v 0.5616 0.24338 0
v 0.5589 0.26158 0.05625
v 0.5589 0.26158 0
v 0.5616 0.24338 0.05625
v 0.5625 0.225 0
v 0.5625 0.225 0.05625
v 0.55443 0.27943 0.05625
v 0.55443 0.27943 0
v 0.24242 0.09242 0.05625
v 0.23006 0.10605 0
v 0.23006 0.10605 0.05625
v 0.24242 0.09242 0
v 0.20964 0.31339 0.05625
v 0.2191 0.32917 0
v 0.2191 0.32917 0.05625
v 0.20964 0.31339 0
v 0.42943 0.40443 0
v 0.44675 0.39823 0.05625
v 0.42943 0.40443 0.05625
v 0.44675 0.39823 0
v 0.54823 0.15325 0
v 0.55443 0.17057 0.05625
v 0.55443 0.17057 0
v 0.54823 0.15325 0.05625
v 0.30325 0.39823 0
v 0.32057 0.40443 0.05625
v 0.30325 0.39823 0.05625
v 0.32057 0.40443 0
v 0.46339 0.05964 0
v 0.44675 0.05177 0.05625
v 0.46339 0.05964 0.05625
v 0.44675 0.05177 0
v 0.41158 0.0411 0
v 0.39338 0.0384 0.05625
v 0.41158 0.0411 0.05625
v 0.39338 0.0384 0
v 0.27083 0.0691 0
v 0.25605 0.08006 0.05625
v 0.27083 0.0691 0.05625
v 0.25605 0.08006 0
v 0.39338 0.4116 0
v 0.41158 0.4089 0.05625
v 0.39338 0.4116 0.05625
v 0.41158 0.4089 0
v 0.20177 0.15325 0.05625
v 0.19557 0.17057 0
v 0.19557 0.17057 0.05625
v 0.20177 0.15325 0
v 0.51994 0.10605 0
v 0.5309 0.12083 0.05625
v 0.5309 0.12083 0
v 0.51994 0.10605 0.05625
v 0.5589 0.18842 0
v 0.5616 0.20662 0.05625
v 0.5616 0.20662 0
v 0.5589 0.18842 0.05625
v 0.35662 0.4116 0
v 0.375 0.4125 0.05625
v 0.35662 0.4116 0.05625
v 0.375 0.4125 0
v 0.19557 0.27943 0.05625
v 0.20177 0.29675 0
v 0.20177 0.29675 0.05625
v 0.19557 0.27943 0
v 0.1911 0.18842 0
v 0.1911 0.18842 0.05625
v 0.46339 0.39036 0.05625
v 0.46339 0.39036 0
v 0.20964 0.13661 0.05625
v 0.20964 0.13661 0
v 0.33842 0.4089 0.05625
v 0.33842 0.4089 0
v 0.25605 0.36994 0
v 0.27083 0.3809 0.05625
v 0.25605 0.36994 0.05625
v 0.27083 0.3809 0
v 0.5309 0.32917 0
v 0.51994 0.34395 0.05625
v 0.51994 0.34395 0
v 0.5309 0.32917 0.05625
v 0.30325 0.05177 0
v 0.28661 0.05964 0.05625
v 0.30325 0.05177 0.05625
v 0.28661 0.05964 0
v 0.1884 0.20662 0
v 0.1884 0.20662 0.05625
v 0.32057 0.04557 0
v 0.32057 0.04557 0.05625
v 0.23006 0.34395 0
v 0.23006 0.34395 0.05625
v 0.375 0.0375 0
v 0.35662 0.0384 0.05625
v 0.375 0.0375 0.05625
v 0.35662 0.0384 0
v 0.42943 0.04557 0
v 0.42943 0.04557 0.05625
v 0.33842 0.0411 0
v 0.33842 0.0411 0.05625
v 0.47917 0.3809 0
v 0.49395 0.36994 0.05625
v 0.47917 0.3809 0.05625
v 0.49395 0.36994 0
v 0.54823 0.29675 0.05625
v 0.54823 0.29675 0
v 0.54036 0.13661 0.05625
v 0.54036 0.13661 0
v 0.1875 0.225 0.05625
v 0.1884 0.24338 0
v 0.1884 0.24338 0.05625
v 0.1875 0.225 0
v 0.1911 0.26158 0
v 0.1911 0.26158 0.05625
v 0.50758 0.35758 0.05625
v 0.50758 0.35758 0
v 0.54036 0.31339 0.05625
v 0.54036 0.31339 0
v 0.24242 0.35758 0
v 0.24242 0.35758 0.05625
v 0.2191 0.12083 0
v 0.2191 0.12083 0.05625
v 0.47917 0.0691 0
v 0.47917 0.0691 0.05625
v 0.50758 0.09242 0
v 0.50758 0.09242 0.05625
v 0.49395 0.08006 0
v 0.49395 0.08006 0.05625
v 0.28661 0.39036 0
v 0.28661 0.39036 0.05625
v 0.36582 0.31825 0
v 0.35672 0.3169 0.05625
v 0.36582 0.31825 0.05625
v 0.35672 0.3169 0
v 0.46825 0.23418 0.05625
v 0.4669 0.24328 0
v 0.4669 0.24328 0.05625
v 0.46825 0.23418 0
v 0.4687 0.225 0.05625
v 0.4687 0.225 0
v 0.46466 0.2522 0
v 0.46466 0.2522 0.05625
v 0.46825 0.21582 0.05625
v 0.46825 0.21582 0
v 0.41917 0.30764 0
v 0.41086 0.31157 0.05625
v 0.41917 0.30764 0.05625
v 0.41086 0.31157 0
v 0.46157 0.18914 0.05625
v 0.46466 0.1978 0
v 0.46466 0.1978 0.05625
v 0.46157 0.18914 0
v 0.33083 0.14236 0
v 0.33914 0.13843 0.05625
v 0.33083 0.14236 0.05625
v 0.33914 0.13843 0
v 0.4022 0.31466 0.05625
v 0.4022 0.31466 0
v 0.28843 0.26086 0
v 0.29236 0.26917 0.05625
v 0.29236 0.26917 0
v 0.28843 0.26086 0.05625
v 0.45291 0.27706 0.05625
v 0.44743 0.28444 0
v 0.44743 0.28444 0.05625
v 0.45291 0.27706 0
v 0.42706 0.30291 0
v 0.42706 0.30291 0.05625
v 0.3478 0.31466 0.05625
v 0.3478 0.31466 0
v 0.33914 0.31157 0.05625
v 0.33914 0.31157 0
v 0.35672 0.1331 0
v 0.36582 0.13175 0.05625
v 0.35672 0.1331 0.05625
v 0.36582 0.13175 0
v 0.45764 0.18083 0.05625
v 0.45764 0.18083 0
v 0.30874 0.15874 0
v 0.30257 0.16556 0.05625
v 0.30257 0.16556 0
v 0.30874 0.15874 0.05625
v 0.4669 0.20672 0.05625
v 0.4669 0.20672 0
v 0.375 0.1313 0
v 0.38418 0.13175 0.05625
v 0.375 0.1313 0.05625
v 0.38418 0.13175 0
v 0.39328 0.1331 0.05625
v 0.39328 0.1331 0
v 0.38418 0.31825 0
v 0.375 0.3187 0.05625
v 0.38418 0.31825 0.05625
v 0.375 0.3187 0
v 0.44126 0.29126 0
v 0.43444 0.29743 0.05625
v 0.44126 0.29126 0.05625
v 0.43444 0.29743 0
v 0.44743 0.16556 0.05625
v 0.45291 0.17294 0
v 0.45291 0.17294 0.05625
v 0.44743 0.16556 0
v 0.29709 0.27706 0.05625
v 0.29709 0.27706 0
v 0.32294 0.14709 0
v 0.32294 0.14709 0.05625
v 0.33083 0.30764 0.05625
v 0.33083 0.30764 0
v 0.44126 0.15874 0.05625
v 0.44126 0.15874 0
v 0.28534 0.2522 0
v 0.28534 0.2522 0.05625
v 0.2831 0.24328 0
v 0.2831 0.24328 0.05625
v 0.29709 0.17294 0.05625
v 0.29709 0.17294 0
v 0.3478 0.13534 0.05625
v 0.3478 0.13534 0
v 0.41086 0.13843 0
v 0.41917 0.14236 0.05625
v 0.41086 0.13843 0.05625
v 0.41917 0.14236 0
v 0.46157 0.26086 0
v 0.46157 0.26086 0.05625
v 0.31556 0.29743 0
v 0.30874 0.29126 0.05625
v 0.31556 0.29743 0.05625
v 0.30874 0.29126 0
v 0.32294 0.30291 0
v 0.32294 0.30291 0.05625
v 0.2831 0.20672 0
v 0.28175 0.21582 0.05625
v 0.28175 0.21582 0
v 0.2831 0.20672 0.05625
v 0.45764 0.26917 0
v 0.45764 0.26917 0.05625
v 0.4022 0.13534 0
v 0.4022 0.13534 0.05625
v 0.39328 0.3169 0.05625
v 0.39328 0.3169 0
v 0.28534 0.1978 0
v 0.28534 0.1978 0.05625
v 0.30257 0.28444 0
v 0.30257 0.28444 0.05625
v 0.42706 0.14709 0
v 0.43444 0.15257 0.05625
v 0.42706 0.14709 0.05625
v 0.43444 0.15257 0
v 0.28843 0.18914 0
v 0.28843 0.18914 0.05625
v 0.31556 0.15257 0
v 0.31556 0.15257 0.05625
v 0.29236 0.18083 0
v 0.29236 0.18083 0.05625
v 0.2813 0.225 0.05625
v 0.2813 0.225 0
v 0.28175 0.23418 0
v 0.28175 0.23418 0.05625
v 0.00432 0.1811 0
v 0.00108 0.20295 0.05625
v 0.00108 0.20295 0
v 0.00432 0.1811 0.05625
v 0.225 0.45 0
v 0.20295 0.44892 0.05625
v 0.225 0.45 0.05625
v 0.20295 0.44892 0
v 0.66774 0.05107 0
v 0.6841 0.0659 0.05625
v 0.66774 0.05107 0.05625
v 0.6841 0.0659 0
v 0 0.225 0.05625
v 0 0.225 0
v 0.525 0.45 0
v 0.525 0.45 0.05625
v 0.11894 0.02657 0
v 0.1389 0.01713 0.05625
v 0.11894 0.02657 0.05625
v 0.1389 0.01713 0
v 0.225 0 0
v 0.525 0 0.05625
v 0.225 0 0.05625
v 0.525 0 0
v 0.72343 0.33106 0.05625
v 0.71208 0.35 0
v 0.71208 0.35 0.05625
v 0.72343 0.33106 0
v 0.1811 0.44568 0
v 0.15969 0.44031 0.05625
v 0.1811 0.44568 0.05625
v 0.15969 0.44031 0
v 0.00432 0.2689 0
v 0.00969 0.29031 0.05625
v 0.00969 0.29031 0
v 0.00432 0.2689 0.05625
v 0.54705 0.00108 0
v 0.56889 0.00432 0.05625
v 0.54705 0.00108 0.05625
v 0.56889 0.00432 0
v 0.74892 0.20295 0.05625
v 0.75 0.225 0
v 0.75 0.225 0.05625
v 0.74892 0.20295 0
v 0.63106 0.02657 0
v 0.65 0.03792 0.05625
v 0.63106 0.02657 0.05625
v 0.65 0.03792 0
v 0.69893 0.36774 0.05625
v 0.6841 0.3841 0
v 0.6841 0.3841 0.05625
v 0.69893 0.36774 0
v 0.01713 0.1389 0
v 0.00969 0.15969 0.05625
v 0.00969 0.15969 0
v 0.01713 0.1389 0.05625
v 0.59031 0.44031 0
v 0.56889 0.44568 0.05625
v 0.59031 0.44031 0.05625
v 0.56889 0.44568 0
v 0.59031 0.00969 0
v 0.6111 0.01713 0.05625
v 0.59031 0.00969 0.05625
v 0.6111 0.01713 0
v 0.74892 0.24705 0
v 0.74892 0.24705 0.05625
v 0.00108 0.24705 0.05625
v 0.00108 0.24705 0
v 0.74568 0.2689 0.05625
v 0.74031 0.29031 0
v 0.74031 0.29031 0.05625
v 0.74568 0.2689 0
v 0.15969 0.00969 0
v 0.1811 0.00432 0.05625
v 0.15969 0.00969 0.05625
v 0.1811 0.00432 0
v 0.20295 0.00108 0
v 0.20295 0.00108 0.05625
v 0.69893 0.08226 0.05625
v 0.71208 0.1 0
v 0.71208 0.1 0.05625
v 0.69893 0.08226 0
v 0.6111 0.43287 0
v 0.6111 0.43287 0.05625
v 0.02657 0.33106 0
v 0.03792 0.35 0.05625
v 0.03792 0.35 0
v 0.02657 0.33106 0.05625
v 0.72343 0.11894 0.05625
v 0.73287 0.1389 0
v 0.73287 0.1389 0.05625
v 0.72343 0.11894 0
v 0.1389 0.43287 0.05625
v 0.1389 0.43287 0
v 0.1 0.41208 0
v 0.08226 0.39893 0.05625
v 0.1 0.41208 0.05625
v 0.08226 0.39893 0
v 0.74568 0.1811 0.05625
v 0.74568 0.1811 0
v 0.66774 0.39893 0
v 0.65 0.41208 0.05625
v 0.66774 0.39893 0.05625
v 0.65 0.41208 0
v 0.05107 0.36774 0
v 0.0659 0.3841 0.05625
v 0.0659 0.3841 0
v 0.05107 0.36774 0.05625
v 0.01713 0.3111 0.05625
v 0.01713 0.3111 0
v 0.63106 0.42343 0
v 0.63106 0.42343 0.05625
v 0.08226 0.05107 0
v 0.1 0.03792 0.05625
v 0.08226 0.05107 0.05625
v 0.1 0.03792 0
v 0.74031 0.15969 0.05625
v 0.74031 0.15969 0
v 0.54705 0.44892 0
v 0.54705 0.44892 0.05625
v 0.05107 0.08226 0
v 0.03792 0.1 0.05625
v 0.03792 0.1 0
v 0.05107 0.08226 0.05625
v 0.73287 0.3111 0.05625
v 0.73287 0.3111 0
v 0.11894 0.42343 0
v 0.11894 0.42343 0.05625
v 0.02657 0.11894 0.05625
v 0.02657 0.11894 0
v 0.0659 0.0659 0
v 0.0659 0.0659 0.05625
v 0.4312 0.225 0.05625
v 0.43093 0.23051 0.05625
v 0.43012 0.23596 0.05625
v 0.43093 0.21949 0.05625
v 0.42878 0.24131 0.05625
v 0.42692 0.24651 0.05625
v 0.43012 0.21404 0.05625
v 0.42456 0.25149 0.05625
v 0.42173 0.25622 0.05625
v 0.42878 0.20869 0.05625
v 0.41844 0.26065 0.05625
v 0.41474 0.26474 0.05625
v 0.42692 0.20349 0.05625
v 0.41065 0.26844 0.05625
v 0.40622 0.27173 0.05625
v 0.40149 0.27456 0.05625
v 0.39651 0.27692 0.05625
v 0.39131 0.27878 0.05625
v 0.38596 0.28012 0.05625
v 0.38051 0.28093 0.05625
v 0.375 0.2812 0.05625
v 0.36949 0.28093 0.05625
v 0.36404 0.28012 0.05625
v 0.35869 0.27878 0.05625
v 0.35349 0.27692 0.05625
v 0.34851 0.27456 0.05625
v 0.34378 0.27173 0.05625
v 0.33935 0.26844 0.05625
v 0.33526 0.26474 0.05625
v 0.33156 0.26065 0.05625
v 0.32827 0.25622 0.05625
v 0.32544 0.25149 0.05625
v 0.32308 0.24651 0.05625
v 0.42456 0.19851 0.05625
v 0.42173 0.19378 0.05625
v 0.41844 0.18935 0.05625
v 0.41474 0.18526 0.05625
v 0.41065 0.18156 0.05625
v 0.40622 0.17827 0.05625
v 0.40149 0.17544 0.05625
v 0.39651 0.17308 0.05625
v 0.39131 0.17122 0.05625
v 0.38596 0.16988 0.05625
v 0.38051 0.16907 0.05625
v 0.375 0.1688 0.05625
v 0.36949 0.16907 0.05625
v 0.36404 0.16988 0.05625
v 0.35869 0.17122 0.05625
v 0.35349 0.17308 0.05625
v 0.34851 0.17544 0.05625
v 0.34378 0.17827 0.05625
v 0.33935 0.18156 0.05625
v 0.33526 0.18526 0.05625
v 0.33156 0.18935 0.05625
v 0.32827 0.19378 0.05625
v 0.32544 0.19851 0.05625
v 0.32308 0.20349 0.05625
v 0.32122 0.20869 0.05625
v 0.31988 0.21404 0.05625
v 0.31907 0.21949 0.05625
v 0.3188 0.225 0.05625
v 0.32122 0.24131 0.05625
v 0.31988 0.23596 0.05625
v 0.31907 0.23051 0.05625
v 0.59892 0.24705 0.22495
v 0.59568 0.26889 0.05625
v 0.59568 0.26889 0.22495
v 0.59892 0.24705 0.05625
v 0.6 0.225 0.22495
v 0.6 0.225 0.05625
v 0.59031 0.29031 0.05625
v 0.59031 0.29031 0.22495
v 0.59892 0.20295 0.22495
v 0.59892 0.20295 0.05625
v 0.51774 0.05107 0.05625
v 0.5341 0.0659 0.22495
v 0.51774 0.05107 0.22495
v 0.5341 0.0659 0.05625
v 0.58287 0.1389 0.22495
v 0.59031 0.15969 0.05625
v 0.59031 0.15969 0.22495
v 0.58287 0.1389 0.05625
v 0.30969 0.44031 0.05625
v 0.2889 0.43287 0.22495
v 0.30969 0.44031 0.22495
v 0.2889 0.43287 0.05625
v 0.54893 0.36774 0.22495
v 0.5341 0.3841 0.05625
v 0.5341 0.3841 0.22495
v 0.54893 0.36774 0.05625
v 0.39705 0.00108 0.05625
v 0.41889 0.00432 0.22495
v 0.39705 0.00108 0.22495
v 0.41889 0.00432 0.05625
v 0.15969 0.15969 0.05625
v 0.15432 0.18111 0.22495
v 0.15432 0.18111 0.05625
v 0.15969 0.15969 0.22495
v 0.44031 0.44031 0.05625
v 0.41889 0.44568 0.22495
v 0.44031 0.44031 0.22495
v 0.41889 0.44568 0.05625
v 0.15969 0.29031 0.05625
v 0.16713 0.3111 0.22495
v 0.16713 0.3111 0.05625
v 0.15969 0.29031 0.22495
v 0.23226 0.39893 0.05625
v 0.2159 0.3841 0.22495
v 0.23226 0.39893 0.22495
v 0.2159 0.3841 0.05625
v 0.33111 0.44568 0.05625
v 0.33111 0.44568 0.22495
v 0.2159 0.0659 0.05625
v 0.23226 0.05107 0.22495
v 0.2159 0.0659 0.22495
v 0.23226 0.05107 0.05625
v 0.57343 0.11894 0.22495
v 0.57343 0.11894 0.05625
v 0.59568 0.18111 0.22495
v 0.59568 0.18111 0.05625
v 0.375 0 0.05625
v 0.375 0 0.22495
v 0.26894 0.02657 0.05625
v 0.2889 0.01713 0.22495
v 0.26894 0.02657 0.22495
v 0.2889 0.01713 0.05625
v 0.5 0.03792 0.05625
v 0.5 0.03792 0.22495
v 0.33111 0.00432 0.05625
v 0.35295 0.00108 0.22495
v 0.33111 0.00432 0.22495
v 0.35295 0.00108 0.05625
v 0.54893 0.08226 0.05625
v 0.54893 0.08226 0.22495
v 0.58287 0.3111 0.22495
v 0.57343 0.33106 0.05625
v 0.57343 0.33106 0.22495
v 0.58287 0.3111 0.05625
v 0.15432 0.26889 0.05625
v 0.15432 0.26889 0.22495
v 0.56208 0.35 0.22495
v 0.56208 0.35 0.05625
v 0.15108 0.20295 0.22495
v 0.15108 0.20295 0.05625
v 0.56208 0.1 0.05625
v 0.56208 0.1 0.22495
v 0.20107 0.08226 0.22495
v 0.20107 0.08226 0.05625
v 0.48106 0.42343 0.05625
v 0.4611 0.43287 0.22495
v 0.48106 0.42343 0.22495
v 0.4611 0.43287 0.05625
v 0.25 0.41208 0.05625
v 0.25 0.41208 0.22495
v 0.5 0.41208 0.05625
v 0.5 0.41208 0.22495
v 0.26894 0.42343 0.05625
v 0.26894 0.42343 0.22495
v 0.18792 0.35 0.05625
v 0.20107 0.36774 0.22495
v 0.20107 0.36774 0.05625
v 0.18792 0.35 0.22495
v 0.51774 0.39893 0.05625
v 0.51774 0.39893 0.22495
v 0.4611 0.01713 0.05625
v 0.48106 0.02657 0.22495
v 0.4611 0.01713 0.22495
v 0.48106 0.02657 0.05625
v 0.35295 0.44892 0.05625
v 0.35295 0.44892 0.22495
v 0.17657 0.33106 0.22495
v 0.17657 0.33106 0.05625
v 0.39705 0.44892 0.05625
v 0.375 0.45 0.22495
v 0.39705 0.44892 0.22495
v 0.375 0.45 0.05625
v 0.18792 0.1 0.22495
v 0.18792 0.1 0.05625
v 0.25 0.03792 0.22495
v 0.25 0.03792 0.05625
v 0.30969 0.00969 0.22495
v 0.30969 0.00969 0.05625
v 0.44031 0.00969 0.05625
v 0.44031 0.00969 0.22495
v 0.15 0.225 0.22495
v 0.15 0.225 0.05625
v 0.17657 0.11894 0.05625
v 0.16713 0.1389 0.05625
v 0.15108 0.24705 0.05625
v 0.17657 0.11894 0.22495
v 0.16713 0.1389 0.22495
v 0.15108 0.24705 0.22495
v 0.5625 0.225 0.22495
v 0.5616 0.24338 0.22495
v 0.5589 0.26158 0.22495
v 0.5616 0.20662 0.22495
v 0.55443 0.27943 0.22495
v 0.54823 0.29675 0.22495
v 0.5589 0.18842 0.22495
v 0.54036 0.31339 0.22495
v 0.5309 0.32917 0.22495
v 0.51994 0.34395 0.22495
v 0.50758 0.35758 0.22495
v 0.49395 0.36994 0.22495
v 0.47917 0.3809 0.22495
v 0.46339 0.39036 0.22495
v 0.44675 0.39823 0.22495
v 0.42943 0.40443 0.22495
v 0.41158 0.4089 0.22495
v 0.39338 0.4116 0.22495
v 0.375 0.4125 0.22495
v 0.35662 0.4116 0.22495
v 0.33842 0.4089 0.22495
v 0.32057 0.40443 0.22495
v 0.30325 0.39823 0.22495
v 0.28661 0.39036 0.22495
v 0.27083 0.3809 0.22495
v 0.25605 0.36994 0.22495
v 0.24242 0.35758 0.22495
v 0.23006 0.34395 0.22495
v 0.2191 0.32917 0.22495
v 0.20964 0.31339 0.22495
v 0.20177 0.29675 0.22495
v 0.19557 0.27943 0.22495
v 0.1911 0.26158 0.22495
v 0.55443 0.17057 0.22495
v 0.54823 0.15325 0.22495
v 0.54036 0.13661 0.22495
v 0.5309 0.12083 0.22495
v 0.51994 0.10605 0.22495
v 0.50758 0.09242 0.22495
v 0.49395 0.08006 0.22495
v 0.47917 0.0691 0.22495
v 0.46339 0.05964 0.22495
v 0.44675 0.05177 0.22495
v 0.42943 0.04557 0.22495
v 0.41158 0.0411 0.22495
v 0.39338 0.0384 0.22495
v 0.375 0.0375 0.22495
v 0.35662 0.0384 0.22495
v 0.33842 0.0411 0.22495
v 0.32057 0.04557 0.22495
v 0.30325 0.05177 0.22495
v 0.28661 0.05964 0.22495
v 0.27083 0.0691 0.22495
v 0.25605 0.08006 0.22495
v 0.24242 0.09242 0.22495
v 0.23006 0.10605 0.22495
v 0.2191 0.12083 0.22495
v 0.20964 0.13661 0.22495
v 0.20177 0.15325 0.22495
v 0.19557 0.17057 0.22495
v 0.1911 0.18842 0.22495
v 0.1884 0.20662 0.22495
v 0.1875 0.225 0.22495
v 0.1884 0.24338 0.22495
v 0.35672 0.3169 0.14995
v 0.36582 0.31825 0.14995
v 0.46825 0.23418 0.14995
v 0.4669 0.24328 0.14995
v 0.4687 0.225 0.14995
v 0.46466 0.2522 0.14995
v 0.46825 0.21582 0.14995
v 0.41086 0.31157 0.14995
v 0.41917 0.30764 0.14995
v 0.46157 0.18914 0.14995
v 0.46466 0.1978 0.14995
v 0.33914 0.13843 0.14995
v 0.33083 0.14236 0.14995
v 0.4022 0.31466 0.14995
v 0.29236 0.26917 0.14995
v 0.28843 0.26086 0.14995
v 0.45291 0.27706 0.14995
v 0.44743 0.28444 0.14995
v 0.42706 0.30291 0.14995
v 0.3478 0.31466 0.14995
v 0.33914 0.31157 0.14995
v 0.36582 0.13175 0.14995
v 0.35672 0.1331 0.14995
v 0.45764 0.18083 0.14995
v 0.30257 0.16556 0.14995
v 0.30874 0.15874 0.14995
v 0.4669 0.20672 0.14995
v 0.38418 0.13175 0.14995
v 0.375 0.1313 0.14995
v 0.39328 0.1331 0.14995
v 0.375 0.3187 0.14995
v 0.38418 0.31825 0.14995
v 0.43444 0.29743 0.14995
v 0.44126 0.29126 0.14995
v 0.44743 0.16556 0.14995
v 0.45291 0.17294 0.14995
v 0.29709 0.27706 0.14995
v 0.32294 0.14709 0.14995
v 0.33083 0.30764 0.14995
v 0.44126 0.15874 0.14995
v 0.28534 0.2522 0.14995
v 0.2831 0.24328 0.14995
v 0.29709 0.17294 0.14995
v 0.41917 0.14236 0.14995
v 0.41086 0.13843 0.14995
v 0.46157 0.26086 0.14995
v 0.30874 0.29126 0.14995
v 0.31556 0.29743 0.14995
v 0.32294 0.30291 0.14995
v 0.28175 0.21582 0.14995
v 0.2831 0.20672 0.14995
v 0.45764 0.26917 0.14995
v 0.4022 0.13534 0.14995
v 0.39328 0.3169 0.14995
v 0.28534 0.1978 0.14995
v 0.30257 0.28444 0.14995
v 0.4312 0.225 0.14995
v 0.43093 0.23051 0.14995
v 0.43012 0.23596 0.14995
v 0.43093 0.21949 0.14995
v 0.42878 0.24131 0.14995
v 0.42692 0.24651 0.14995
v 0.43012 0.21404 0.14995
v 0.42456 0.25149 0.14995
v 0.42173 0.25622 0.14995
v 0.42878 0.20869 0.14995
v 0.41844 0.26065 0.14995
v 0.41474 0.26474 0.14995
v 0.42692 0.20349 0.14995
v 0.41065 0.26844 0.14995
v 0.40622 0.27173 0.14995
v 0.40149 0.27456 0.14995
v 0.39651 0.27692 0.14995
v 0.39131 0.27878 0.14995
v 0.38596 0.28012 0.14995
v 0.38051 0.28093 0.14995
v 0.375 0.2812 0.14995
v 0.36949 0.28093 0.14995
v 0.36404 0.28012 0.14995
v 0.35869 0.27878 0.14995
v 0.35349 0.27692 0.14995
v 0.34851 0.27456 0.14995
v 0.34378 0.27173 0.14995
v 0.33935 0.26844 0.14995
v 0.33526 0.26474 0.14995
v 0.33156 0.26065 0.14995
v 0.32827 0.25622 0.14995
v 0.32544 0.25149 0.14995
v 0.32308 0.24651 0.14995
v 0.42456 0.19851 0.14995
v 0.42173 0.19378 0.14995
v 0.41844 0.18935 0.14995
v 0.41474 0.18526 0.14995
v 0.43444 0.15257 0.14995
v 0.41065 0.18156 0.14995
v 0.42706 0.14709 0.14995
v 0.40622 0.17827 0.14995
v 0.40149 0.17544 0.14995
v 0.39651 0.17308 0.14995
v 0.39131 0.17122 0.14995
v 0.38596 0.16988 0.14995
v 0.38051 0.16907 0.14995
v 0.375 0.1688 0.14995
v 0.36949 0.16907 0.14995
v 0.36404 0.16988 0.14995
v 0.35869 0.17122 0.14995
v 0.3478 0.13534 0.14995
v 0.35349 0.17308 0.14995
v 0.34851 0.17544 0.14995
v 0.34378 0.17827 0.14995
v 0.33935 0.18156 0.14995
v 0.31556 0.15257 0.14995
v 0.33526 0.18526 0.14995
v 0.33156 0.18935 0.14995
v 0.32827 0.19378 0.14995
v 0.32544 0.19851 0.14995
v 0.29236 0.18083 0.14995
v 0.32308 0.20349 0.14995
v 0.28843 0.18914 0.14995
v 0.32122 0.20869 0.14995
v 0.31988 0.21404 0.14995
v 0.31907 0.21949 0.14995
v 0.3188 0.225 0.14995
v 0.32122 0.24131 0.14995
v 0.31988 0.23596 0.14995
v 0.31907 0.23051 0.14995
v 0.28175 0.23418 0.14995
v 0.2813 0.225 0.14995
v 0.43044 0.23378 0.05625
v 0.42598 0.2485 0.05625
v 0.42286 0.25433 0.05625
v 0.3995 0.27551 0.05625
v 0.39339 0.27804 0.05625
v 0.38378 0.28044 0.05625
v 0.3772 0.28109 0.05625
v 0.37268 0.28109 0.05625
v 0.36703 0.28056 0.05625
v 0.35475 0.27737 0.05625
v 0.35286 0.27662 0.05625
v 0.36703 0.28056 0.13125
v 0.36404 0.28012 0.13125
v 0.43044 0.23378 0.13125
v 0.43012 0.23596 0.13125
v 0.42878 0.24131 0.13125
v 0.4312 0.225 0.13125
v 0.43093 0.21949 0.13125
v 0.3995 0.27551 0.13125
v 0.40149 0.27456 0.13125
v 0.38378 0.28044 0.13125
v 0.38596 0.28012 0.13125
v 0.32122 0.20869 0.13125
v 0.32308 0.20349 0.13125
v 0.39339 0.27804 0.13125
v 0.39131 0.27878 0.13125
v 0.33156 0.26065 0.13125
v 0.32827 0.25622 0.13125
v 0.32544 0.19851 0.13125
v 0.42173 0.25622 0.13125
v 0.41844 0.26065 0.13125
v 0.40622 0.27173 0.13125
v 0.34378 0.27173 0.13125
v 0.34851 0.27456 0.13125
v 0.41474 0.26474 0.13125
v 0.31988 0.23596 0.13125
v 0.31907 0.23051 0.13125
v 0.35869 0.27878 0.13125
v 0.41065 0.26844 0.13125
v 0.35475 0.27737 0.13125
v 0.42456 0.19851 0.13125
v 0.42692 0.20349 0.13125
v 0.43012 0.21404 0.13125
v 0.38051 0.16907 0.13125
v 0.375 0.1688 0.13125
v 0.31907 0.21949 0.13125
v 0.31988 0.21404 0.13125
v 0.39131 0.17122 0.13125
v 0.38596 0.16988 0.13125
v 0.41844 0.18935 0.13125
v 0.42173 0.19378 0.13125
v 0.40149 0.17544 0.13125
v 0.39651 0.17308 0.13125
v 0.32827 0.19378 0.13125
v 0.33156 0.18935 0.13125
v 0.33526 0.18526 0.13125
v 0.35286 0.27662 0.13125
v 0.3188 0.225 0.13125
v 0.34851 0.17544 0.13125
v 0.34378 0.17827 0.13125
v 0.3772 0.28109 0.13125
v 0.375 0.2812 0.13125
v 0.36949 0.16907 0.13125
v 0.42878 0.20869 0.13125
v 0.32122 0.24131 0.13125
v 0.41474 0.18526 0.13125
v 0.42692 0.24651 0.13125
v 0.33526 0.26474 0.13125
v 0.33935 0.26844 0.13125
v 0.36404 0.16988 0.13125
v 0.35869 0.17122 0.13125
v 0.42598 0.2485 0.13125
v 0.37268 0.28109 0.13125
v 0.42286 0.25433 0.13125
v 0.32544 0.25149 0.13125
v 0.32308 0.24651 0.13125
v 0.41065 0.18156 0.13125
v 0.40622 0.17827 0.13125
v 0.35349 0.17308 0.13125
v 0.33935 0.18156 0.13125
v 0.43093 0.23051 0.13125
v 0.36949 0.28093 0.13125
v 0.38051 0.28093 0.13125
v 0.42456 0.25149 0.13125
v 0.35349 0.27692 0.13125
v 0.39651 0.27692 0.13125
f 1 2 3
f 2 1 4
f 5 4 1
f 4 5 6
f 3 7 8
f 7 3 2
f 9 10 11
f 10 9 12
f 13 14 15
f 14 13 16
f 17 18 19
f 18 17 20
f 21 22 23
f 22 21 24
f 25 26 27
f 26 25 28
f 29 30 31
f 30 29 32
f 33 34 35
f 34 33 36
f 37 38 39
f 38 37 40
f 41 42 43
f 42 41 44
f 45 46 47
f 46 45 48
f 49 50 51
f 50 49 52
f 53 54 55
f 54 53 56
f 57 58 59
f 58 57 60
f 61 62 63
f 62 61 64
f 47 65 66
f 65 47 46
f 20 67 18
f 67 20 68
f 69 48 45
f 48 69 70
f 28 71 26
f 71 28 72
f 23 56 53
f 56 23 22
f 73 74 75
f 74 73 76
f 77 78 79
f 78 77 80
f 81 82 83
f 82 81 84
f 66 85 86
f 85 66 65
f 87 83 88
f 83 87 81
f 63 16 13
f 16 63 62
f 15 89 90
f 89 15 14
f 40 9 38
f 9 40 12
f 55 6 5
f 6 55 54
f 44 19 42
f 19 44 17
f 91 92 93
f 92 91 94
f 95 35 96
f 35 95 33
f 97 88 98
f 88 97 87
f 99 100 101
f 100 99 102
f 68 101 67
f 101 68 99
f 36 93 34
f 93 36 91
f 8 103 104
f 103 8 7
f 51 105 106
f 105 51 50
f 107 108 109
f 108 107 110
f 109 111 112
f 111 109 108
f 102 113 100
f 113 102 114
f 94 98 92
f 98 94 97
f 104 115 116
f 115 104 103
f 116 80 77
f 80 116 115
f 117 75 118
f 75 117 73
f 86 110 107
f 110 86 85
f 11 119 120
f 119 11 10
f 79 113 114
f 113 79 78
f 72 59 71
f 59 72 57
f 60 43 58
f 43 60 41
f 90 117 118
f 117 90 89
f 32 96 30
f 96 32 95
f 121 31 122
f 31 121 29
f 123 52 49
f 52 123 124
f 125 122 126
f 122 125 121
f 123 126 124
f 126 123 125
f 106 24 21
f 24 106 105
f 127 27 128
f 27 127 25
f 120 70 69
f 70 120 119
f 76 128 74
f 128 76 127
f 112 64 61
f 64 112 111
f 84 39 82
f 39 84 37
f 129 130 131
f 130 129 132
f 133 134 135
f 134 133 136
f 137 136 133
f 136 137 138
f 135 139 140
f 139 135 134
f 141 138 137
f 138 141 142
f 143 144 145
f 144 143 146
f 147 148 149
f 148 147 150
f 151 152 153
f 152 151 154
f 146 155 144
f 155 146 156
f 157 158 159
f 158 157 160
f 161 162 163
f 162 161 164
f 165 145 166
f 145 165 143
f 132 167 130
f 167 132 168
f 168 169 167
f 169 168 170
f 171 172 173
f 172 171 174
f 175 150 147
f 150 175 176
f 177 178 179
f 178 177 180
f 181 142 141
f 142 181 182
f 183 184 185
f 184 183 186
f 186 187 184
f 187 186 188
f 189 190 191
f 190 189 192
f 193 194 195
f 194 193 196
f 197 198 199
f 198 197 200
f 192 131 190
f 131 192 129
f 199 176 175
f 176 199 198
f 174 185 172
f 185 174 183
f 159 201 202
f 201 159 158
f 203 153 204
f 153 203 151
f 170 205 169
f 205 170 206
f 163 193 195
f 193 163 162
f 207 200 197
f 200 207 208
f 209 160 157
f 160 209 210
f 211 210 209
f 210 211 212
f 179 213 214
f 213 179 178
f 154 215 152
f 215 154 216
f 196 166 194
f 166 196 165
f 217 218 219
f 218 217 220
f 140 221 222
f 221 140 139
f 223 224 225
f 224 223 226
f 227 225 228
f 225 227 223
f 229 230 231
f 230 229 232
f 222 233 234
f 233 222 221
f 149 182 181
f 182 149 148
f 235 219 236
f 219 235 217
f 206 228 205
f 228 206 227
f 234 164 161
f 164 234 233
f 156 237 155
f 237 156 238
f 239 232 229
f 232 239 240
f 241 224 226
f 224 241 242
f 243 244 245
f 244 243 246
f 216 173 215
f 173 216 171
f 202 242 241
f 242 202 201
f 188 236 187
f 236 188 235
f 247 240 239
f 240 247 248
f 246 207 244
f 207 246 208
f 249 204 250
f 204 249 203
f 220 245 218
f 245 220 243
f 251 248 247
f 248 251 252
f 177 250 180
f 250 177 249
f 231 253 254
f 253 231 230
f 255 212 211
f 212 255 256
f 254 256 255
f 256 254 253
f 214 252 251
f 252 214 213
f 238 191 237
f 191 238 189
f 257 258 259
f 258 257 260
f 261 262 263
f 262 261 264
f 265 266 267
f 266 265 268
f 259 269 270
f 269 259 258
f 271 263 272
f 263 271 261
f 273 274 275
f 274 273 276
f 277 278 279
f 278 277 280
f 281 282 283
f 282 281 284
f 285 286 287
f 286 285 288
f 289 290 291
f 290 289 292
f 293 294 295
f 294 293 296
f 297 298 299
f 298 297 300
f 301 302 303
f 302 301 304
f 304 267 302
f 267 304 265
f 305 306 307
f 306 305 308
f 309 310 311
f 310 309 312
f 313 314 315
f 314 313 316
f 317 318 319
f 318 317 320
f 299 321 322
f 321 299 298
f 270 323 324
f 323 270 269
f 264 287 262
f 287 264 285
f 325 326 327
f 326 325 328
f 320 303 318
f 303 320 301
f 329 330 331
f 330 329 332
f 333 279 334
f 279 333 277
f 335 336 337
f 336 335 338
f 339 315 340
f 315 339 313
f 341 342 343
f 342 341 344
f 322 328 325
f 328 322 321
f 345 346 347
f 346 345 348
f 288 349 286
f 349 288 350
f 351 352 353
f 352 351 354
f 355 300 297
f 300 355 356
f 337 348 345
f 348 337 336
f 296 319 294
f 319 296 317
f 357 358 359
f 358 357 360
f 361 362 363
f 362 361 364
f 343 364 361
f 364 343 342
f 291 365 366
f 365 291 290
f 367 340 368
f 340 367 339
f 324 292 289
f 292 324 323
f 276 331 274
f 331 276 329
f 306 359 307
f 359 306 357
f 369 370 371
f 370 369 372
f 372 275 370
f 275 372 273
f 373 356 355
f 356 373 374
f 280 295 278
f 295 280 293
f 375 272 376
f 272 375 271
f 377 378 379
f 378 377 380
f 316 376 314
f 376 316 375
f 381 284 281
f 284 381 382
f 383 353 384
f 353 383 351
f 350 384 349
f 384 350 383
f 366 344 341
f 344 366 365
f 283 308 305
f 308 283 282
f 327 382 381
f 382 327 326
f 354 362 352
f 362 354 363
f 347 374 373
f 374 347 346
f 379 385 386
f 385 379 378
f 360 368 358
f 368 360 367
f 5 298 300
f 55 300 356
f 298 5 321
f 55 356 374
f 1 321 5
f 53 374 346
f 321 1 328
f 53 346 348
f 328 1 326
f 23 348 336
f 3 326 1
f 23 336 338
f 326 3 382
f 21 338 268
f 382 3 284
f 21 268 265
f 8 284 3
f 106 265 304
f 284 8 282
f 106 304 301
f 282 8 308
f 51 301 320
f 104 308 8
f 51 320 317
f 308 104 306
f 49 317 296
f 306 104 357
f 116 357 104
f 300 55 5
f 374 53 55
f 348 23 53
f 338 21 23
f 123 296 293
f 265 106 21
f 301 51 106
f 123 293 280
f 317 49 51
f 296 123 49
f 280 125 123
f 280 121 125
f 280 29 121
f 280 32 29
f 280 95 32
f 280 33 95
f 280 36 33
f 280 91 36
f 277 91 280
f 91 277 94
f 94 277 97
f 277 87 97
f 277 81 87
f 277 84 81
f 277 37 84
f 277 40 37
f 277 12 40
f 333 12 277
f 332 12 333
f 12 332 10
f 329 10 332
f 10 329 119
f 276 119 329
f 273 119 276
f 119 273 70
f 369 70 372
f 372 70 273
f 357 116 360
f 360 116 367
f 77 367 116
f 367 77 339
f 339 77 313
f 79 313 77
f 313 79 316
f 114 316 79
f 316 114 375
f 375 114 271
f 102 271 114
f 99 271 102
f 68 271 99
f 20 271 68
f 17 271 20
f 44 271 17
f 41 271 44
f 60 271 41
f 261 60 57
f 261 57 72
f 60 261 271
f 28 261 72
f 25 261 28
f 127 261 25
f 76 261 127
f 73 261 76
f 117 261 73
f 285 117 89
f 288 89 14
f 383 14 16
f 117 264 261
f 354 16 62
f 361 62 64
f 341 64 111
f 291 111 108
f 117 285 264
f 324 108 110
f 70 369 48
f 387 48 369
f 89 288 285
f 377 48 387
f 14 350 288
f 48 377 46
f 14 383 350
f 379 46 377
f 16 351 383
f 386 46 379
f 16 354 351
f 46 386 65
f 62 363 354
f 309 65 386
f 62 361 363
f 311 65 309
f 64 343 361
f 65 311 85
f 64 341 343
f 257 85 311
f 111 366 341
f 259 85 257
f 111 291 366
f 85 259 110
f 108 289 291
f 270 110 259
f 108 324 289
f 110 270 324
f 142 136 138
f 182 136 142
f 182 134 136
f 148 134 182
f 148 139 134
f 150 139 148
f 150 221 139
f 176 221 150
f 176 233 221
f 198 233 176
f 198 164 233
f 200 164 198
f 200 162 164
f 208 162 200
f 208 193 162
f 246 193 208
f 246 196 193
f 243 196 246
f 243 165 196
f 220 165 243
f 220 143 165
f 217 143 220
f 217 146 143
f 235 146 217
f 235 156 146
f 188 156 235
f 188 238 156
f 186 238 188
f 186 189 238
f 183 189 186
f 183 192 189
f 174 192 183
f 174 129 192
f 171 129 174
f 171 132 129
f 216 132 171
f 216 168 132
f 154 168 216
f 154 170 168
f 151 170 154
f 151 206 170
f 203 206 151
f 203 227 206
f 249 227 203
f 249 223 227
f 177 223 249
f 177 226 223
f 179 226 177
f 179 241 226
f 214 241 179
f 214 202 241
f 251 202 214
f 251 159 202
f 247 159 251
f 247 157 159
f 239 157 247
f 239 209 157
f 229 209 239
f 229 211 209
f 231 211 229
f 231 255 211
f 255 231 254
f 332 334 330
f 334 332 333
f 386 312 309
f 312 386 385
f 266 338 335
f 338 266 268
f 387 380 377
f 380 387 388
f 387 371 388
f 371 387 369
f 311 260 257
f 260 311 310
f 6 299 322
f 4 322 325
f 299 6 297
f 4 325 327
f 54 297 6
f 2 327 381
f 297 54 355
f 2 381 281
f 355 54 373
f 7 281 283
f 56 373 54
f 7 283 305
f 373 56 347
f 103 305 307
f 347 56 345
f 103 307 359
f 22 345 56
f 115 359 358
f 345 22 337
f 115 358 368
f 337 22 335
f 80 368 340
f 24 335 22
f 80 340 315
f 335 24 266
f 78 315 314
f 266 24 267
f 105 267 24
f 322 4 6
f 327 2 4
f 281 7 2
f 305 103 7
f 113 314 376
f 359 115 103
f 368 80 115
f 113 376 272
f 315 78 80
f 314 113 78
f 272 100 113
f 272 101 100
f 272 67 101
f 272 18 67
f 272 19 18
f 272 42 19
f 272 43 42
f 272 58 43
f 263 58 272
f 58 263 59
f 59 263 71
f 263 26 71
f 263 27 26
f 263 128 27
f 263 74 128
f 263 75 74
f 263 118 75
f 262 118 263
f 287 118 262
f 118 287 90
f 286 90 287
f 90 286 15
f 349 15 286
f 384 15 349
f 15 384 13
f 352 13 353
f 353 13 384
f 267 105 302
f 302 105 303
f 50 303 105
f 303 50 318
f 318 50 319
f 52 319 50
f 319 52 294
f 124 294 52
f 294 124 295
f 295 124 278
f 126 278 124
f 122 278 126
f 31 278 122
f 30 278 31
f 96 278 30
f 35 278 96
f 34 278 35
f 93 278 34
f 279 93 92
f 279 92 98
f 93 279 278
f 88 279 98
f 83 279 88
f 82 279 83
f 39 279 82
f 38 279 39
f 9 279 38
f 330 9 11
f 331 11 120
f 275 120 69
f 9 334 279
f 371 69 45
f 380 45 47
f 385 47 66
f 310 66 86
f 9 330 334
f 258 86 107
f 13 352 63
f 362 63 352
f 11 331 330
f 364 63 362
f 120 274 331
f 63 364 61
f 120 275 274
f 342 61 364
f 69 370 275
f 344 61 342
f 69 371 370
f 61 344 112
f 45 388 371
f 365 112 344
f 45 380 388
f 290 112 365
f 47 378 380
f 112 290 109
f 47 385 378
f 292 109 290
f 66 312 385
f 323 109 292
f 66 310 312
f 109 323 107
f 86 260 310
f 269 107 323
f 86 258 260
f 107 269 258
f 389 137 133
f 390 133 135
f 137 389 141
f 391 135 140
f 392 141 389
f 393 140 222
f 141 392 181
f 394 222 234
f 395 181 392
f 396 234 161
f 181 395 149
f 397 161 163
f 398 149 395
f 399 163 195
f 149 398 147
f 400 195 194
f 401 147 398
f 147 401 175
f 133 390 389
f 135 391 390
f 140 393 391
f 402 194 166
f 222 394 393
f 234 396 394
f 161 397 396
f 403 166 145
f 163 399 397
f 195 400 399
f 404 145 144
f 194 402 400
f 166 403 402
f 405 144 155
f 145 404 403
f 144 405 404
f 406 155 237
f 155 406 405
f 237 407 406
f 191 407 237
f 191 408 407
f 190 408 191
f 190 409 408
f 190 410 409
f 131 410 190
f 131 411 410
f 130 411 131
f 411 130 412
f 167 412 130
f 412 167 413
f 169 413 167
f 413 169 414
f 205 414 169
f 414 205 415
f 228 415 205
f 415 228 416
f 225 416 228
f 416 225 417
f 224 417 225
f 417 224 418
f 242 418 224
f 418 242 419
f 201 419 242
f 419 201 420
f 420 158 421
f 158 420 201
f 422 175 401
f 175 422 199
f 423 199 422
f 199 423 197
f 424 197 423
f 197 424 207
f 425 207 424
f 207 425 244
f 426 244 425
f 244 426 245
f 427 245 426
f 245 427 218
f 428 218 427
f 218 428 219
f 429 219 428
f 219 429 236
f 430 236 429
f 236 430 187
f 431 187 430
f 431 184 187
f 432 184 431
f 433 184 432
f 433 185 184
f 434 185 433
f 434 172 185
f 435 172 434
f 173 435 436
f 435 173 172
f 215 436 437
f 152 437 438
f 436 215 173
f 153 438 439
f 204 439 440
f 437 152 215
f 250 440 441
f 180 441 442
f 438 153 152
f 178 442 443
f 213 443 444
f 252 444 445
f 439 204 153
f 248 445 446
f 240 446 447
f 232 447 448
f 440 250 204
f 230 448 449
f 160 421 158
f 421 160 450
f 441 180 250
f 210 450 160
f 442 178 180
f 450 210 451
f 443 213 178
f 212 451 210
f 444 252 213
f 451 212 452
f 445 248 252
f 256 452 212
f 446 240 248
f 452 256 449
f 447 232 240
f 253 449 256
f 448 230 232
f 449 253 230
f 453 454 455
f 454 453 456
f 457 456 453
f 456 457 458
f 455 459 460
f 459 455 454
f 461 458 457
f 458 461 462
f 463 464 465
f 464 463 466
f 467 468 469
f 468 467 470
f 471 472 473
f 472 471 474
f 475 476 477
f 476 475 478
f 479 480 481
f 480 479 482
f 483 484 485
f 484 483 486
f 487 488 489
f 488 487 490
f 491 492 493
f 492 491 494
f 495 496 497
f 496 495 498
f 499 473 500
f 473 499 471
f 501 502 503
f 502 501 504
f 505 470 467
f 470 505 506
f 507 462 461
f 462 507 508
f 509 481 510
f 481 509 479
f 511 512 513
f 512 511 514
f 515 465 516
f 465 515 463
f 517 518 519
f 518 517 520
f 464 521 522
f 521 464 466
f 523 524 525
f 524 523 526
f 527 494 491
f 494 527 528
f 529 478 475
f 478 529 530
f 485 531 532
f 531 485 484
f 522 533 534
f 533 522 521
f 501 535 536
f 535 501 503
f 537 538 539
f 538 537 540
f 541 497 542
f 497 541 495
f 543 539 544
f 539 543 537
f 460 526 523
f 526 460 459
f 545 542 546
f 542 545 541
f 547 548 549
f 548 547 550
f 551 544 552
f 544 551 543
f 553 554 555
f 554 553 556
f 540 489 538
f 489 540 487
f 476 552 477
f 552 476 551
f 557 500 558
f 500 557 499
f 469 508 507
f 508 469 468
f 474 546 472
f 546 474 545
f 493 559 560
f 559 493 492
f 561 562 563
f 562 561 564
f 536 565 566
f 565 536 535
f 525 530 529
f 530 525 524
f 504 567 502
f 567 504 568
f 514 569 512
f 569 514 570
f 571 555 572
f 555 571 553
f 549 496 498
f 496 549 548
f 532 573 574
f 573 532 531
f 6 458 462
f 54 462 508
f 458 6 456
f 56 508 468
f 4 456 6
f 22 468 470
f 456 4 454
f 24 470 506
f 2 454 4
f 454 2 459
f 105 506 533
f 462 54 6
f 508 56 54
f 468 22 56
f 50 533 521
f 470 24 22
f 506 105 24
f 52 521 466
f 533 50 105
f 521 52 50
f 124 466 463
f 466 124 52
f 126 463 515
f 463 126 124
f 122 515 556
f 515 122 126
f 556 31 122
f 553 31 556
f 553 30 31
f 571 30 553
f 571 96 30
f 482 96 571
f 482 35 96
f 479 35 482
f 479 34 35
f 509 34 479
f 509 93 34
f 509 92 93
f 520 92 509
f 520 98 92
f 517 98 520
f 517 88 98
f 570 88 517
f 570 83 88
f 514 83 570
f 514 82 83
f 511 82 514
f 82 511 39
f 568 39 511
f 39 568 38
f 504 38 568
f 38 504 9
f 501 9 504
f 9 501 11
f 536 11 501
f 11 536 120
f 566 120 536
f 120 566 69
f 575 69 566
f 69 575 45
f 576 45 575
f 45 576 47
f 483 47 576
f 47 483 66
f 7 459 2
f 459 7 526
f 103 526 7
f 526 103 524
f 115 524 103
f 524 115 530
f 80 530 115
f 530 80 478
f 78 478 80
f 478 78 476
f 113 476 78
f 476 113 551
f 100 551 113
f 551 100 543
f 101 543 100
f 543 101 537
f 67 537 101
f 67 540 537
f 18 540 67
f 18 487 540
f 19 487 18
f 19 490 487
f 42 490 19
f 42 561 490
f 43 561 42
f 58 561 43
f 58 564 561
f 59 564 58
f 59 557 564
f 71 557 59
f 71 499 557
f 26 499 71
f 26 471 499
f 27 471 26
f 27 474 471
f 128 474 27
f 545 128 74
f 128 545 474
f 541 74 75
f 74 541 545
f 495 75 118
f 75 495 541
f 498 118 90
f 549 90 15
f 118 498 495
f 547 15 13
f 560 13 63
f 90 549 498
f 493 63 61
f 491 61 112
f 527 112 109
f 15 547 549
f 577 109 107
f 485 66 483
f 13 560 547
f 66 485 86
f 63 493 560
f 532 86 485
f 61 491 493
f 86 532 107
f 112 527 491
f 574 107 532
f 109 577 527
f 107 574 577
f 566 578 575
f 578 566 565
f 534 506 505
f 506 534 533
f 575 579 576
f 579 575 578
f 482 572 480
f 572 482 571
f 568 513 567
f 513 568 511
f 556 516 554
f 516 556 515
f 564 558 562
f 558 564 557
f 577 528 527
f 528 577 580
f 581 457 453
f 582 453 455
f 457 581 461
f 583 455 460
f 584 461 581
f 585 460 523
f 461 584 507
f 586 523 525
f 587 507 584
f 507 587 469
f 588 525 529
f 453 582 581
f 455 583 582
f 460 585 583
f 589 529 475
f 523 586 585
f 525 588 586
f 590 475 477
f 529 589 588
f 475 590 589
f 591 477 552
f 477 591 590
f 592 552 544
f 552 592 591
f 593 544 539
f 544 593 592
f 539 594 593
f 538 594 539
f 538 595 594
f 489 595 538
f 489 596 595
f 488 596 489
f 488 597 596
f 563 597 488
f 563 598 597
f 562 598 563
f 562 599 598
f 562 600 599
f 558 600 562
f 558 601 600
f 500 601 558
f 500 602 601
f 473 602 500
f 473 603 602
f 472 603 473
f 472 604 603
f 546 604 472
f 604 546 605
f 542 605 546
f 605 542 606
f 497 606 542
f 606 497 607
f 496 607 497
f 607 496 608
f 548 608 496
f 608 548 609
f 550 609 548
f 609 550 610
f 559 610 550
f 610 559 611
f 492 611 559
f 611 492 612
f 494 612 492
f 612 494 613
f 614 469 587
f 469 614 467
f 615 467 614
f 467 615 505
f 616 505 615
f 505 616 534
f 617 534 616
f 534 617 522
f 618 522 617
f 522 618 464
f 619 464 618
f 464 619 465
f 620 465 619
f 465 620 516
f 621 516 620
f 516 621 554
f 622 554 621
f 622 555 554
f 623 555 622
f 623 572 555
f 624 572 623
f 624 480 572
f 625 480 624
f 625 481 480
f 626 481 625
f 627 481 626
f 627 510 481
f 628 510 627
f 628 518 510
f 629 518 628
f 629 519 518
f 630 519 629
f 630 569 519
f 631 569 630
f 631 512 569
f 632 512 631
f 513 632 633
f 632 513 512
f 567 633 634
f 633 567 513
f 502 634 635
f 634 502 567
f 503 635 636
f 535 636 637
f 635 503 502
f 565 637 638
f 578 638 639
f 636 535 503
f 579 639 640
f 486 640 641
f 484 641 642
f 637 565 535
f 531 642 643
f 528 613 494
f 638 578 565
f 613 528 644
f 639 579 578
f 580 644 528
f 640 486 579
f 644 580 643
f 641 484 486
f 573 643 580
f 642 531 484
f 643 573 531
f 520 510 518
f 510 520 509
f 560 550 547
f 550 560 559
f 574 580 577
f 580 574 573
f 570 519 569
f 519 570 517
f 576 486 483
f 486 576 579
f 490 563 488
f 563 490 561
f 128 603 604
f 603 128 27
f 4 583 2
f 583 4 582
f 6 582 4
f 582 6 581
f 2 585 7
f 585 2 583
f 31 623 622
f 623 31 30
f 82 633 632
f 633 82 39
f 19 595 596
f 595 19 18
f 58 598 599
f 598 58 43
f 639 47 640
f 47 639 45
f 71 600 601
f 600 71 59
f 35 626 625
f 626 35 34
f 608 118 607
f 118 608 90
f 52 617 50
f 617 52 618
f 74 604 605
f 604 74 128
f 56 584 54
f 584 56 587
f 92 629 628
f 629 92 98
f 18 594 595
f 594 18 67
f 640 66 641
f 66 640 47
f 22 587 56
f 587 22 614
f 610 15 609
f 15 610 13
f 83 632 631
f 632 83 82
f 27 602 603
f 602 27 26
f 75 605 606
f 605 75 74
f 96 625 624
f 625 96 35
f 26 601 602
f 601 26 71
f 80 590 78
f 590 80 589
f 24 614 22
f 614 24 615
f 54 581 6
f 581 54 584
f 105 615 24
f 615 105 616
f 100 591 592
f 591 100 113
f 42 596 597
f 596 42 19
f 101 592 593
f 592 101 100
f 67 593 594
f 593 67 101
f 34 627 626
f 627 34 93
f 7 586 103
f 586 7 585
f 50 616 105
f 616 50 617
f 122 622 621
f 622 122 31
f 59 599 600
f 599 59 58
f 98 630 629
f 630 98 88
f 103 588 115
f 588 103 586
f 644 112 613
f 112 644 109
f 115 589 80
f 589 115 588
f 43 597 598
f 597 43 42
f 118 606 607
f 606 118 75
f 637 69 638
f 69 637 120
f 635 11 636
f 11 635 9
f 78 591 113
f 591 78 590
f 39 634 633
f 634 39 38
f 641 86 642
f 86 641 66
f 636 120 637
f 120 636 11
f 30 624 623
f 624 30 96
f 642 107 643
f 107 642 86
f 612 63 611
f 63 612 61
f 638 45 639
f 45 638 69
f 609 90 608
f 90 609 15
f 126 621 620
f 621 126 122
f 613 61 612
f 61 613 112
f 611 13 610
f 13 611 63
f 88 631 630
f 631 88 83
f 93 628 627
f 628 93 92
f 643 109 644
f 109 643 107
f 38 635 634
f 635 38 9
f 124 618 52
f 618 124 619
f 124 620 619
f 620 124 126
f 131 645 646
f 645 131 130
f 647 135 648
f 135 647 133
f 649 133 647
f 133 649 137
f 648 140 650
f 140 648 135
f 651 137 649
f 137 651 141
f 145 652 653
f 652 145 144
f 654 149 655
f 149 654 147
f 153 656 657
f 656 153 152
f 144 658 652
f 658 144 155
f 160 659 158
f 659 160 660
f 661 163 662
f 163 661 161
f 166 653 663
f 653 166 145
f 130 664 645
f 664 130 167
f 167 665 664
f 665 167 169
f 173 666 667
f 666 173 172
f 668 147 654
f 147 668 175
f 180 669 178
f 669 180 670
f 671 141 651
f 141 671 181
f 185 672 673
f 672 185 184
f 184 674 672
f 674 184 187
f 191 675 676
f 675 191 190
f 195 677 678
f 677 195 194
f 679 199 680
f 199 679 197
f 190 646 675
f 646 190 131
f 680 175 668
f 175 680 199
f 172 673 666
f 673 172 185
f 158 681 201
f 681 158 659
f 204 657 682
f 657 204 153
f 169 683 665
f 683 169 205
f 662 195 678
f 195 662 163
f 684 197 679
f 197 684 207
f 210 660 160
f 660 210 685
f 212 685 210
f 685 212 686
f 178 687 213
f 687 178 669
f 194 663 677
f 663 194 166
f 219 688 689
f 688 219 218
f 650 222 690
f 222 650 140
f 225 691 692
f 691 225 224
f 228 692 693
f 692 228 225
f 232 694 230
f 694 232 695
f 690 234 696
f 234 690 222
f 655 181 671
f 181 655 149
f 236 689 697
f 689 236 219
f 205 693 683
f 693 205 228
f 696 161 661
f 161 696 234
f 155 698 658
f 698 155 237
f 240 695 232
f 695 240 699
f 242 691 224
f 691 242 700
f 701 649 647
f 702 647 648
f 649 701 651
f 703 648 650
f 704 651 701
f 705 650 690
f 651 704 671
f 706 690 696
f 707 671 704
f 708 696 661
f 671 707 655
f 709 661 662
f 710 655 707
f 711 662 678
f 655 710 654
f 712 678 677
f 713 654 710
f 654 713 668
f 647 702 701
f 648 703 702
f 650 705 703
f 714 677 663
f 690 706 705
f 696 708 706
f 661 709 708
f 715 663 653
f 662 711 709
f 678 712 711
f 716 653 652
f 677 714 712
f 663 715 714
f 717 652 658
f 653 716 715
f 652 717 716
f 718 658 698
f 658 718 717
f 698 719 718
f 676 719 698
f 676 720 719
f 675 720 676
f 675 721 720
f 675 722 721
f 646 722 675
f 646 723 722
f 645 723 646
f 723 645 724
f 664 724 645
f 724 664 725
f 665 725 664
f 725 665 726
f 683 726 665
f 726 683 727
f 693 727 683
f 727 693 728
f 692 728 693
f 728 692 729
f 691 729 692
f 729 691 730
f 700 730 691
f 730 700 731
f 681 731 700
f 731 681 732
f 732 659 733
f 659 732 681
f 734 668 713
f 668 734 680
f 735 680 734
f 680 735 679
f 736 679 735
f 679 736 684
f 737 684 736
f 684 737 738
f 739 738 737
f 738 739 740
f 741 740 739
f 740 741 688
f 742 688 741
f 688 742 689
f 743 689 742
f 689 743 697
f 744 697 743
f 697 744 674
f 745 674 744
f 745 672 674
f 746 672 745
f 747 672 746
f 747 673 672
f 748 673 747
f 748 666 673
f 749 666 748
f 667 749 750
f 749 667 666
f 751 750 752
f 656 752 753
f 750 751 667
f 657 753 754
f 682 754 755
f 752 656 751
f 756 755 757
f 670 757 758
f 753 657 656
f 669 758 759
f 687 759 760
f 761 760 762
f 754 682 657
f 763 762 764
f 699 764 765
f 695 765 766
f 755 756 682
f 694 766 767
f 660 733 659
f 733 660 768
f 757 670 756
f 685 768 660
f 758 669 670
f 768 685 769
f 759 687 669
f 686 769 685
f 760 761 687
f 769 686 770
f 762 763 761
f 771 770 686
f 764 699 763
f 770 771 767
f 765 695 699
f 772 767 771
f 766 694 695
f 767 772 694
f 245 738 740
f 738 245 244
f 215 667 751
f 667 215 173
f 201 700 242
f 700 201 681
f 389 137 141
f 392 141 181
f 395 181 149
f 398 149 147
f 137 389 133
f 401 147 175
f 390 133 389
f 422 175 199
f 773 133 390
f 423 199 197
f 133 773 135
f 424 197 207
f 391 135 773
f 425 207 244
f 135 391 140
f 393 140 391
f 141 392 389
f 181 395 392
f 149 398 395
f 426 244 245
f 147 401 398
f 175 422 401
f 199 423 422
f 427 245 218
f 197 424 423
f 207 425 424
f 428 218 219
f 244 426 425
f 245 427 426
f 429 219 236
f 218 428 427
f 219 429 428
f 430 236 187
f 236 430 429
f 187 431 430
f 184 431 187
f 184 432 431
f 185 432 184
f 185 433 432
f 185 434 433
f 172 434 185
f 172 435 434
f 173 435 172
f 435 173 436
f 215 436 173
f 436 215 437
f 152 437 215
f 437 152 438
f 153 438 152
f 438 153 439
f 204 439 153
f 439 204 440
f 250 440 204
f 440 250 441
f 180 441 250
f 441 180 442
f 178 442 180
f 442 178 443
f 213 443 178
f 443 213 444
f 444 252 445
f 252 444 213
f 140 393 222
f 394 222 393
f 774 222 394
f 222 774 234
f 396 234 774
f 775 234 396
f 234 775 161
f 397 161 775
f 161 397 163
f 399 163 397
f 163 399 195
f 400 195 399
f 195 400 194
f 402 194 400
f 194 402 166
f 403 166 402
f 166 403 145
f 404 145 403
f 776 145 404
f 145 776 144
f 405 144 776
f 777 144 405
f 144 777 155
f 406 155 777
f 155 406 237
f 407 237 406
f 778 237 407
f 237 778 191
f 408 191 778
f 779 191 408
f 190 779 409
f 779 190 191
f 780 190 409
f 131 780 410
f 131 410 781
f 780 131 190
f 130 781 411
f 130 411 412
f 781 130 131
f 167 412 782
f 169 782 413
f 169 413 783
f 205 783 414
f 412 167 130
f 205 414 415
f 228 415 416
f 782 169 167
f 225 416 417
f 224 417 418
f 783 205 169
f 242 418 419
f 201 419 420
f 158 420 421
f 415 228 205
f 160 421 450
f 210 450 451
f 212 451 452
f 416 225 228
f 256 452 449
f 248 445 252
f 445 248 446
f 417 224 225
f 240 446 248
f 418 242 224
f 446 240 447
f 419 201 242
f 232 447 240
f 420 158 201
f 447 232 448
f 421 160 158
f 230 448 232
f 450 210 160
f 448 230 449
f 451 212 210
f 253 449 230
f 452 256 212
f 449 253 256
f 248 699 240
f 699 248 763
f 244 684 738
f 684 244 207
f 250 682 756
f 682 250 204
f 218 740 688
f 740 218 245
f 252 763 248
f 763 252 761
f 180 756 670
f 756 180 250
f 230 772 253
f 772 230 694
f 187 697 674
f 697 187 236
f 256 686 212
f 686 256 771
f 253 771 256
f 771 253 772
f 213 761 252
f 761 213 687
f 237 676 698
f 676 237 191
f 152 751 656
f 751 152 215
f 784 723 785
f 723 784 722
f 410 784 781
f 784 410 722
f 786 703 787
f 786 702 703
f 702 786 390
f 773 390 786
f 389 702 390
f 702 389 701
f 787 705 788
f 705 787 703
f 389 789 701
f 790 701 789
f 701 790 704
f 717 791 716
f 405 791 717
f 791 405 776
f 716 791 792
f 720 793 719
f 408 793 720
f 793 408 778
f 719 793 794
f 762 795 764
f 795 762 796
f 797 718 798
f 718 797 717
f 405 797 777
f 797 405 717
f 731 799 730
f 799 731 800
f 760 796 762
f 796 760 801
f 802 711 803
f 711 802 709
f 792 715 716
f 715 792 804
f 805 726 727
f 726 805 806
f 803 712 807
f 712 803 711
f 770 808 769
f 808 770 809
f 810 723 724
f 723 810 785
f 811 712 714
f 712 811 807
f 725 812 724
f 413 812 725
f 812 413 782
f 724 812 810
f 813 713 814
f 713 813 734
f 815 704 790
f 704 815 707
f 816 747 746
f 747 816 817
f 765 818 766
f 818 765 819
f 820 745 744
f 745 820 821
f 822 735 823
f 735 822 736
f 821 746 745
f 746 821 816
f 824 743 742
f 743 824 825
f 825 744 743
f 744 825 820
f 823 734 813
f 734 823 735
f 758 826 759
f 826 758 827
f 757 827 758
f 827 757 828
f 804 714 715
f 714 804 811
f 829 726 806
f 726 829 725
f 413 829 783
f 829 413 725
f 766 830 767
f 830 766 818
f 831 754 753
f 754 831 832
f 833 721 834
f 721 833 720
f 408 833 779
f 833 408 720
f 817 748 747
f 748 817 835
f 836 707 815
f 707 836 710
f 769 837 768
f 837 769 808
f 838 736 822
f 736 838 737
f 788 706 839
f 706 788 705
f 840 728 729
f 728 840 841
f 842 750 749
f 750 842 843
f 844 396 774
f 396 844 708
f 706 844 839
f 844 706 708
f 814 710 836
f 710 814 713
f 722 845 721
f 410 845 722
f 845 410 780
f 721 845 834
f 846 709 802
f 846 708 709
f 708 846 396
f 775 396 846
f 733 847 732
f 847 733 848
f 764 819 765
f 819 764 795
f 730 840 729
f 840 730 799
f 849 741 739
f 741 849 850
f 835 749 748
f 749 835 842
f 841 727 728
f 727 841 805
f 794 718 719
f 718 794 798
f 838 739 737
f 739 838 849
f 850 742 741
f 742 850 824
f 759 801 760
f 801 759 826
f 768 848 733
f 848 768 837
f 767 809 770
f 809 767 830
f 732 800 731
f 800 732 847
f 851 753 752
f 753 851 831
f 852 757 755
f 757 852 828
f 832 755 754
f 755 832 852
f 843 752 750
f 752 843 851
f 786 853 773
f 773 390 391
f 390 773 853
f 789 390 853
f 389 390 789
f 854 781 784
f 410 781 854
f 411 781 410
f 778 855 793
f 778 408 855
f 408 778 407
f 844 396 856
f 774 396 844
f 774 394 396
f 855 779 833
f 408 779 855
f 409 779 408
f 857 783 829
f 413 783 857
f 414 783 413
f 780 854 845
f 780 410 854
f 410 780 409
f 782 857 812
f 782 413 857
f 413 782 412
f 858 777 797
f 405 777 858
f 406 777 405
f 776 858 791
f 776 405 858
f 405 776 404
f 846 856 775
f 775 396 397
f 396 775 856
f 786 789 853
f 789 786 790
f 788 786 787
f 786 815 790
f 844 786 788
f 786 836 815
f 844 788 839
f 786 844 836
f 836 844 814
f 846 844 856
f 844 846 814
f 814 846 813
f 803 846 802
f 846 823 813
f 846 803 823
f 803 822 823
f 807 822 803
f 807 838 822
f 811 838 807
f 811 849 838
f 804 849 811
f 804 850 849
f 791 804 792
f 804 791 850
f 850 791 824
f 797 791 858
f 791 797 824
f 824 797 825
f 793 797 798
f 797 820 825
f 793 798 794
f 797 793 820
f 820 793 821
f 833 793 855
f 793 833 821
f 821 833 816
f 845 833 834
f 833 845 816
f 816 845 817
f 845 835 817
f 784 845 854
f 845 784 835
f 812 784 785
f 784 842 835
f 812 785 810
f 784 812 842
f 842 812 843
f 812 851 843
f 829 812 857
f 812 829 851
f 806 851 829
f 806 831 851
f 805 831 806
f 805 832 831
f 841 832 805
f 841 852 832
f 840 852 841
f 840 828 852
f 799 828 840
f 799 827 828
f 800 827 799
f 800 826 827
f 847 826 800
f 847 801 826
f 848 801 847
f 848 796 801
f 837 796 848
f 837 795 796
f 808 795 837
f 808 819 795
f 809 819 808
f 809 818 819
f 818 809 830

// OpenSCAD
// ==============================
// Parametric Dimensions
// ==============================
// Base footprint dimensions
base_length = 0.75;       // Total length of slot base
base_width = 0.45;        // Total width of slot base
base_height = 0.05625;    // Thickness of base plate
// Central axis position (from left/front edges)
central_x = 0.375;
central_y = 0.225;
// Concentric feature dimensions
collar_outer_r = 0.225;   // Outer radius of top annular collar
collar_inner_r = 0.1875;  // Inner radius of top annular collar
collar_height = 0.1687;   // Height of collar above base shoulder
small_annular_outer_r = 0.0937;  // Outer radius of middle annular section
small_annular_inner_r = 0.0562;  // Inner radius of middle annular section
small_annular_height = 0.0937;   // Height of middle section above shoulder
inner_solid_r = 0.0562;   // Radius of innermost solid post
inner_solid_height = 0.075;      // Height of inner post above shoulder
// Curve resolution
$fn = 64;

// ==============================
// Helper Module: Rounded Slot Base
// ==============================
module rounded_slot_base(length, width, height) {
    linear_extrude(height=height) {
        // Hull two half-circle ends to make slot shape
        hull() {
            translate([width/2, width/2, 0]) circle(r=width/2);
            translate([length - width/2, width/2, 0]) circle(r=width/2);
        }
    }
}

// ==============================
// Main Model Assembly
// ==============================
union() {
    // Base plate with hollow cutouts
    difference() {
        rounded_slot_base(base_length, base_width, base_height);
        // Cut hollow annulus between 0.1875 and 0.0937 radius through base
        translate([central_x, central_y, -0.01]) difference() {
            cylinder(h=base_height + 0.02, r=collar_inner_r);
            cylinder(h=base_height + 0.02, r=small_annular_outer_r);
        }
    }

    // Outer coaxial annular collar
    translate([central_x, central_y, base_height]) difference() {
        cylinder(h=collar_height, r=collar_outer_r);
        cylinder(h=collar_height + 0.02, r=collar_inner_r);
    }

    // Middle coaxial annular section
    translate([central_x, central_y, base_height]) difference() {
        cylinder(h=small_annular_height, r=small_annular_outer_r);
        cylinder(h=small_annular_height + 0.02, r=small_annular_inner_r);
    }

    // Innermost solid circular post
    translate([central_x, central_y, base_height]) cylinder(h=inner_solid_height, r=inner_solid_r);
}
